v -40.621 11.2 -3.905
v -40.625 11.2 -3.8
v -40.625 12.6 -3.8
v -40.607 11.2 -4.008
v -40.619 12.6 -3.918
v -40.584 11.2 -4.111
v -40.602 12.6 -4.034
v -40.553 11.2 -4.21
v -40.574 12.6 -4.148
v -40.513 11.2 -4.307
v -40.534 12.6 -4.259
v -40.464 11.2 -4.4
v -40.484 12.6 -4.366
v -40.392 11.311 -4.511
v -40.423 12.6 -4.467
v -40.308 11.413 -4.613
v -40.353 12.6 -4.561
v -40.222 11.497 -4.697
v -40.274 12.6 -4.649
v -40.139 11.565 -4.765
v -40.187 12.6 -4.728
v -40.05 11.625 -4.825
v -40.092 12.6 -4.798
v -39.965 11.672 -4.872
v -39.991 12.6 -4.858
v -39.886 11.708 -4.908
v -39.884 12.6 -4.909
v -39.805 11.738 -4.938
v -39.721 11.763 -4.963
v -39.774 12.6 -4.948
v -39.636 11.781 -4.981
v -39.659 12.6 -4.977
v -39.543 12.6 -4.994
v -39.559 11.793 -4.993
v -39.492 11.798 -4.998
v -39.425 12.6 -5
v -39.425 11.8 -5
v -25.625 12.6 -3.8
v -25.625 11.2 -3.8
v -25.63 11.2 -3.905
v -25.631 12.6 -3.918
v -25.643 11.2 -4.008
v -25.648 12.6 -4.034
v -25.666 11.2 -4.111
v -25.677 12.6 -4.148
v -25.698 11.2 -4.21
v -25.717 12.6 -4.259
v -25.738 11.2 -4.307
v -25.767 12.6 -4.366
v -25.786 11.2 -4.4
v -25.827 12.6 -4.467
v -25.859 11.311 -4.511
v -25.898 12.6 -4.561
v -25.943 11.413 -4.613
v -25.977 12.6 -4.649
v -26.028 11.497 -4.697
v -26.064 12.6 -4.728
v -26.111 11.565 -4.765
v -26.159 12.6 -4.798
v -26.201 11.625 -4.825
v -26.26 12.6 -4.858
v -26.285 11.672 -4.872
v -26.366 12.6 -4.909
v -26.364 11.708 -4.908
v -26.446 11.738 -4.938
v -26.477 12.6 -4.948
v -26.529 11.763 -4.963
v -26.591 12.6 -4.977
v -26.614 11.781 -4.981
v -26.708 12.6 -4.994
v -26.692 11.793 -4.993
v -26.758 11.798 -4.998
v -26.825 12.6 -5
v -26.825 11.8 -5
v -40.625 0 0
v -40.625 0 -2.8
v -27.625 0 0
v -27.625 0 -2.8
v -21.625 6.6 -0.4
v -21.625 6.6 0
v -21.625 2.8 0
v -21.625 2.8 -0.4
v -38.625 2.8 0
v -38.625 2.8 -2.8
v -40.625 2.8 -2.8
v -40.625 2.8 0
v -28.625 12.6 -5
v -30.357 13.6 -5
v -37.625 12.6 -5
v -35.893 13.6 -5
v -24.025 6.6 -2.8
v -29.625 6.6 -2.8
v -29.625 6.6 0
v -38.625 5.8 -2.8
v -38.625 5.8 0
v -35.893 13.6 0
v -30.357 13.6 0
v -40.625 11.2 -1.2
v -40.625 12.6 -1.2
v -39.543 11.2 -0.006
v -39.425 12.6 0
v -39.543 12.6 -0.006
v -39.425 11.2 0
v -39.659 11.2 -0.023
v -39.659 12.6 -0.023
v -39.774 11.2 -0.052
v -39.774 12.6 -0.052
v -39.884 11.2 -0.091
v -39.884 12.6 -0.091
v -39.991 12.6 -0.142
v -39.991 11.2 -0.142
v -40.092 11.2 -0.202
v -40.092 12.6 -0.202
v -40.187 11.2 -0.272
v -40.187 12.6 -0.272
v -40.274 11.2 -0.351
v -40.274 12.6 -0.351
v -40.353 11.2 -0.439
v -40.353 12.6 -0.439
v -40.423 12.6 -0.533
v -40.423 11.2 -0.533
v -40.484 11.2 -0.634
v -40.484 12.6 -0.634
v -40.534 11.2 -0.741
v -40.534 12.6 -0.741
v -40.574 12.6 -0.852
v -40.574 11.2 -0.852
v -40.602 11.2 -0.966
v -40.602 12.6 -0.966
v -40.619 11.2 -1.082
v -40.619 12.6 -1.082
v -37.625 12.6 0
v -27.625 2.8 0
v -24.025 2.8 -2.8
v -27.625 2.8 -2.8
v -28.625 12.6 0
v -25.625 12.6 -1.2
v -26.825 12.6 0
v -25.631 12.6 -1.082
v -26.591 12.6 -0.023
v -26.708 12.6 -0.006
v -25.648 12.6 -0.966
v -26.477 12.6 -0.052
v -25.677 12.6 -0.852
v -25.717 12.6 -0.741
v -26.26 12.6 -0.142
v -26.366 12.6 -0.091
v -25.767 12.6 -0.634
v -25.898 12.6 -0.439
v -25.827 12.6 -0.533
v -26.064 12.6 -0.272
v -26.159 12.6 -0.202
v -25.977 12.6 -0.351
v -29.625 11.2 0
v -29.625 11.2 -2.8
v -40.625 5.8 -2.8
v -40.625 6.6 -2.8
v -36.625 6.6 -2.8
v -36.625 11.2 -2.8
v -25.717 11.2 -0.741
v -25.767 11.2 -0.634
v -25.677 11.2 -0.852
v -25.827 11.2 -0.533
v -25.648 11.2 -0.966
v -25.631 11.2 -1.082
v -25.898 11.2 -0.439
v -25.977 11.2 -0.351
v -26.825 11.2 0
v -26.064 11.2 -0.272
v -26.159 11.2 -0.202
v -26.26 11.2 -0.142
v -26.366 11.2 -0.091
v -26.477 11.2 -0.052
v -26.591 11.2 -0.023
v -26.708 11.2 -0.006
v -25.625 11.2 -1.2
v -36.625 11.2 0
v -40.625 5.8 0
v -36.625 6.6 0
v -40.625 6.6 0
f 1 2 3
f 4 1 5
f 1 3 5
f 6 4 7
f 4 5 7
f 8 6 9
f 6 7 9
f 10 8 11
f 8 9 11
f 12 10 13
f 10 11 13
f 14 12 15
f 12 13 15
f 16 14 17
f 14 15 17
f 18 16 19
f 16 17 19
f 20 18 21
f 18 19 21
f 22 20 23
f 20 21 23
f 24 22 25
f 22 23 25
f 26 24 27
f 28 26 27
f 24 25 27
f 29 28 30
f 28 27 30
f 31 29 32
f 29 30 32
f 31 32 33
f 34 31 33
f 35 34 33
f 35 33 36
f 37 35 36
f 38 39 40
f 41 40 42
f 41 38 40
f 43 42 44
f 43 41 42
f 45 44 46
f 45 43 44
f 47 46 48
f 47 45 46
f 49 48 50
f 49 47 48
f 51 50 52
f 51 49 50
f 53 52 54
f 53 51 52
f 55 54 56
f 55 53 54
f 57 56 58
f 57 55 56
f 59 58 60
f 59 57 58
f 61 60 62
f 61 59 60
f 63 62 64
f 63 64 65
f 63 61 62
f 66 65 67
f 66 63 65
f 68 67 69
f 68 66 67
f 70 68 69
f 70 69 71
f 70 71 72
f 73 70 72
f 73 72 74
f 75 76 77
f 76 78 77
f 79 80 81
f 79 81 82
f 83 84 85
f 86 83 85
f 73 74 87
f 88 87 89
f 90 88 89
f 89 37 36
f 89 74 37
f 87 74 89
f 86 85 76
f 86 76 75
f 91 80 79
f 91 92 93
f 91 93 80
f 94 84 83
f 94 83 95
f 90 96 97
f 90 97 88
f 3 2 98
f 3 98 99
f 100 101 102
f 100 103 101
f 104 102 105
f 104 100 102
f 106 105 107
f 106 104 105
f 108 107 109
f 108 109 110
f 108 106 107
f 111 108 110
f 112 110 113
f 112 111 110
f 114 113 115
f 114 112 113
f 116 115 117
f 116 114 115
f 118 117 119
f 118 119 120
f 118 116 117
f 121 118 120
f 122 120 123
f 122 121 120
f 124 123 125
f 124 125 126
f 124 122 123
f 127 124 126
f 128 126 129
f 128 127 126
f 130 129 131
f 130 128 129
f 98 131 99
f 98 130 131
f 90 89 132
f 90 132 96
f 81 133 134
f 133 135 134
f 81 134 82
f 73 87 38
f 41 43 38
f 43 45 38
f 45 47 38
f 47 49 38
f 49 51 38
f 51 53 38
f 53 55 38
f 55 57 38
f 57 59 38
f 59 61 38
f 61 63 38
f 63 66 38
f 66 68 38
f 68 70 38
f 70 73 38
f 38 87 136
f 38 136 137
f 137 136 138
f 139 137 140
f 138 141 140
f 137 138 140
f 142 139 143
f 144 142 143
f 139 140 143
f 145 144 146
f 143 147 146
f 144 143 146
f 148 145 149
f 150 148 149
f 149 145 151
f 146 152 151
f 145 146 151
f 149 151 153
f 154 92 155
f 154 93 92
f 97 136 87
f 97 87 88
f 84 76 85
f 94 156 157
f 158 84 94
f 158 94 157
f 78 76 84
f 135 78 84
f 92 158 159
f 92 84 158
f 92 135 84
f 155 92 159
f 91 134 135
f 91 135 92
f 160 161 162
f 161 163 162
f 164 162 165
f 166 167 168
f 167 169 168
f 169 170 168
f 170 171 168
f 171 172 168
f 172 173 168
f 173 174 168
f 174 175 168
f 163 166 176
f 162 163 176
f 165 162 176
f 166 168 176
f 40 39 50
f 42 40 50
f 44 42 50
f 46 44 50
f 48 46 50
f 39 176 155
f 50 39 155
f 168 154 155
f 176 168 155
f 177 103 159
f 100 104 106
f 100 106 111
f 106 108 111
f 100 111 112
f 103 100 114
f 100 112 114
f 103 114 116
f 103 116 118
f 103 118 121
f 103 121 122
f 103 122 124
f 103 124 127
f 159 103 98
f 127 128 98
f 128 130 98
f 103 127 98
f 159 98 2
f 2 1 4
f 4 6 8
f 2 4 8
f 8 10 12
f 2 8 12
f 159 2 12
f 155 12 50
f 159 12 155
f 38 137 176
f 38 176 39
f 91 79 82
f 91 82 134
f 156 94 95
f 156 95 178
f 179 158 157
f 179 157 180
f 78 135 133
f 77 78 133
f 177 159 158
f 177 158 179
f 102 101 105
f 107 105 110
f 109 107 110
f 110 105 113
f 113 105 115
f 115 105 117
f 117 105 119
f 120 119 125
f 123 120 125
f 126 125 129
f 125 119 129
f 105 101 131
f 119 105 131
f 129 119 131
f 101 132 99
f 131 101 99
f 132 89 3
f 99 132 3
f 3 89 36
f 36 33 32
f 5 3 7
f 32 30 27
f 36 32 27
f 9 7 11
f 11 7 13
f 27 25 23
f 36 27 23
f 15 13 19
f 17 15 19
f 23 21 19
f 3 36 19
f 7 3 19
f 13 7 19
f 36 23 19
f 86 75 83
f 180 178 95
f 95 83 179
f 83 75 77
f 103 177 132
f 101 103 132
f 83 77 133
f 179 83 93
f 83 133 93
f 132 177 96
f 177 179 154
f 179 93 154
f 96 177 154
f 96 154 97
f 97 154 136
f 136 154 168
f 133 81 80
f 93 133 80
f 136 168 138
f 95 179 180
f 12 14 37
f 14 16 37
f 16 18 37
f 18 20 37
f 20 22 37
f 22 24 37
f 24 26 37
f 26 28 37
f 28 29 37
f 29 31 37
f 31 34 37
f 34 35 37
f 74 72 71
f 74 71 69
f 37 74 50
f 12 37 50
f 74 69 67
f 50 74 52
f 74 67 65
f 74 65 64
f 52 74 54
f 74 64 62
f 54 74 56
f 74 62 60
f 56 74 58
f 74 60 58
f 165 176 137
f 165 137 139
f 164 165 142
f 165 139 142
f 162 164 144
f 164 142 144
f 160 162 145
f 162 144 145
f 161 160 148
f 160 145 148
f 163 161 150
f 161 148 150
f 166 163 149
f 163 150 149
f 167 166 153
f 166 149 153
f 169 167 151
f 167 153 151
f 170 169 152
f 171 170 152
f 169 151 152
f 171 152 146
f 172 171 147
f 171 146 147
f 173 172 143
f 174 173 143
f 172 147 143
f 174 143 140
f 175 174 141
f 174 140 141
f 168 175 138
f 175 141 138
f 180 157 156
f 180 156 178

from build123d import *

# Parameters (mm, degrees)
BOSS_EXTRUDE1_DEPTH = 3.8
SKETCH2_W           = 11
SKETCH2_H           = 2.8
BOSS_EXTRUDE2_DEPTH = 7
SKETCH3_W           = 4
SKETCH3_H           = 8.4
CUT_EXTRUDE1_DEPTH  = 43.932622105
SKETCH4_W           = 11
SKETCH4_H           = 2.4
BOSS_EXTRUDE3_DEPTH = 2.2
SKETCH5_W           = 5
SKETCH5_H           = 2.4
BOSS_EXTRUDE4_DEPTH = 4
SKETCH6_W           = 9
SKETCH6_H           = 2.8
BOSS_EXTRUDE5_DEPTH = 2.8
SKETCH7_W           = 2.8
SKETCH7_H           = 6.6
BOSS_EXTRUDE6_DEPTH = 4
SKETCH8_W           = 4.732050808
SKETCH8_H           = 1
CUT_EXTRUDE2_DEPTH  = 44.13200715
SKETCH9_W           = 4.732050807
SKETCH9_H           = 1
CUT_EXTRUDE3_DEPTH  = 44.13200715
SKETCH10_W          = 2
SKETCH10_H          = 3
CUT_EXTRUDE4_DEPTH  = 43.932622105
DRAFT1_ANGLE        = 60
CHAMFER1_SIZE       = 0.6
FILLET1_R           = 1.2


with BuildPart() as part:
    # Sketch1 → Boss-Extrude1 (new body)
    with BuildSketch(Plane(origin=(0, 6.6, 0), x_dir=(1, 0, 0), z_dir=(0, 1, 0))):
        Polygon((-21.625238963, 0.4), (-24.025238963, 2.8), (-40.625238963, 2.8), (-40.625238963, 0), (-21.625238963, 0), align=None)
    extrude(amount=-BOSS_EXTRUDE1_DEPTH)

    # Sketch2 → Boss-Extrude2 (add)
    with BuildSketch(Plane(origin=(0, 6.6, 0), x_dir=(-1, 0, 0), z_dir=(0, 1, 0))):
        with Locations((35.125238963, -1.4)):
            Rectangle(SKETCH2_W, SKETCH2_H)
    extrude(amount=BOSS_EXTRUDE2_DEPTH)

    # Sketch3 → Cut-Extrude1 (cut, through all)
    with BuildSketch(Plane.XY):
        with Locations((-38.625238963, 7)):
            Rectangle(SKETCH3_W, SKETCH3_H)
    extrude(amount=-CUT_EXTRUDE1_DEPTH, mode=Mode.SUBTRACT)

    # Sketch4 → Boss-Extrude3 (add)
    with BuildSketch(Plane(origin=(0, 0, -2.8), x_dir=(-1, 0, 0), z_dir=(0, 0, -1))):
        with Locations((35.125238963, 12.4)):
            Rectangle(SKETCH4_W, SKETCH4_H)
    extrude(amount=BOSS_EXTRUDE3_DEPTH)

    # Sketch5 → Boss-Extrude4 (add)
    with BuildSketch(Plane(origin=(-29.625238963, 0, 0), x_dir=(0, 0, -1), z_dir=(1, 0, 0))):
        with Locations((2.5, 12.4)):
            Rectangle(SKETCH5_W, SKETCH5_H)
    extrude(amount=BOSS_EXTRUDE4_DEPTH)

    # Sketch6 → Boss-Extrude5 (add)
    with BuildSketch(Plane.XZ.offset(-2.8)):
        with Locations((-32.125238963, -1.4)):
            Rectangle(SKETCH6_W, SKETCH6_H)
    extrude(amount=BOSS_EXTRUDE5_DEPTH)

    # Sketch7 → Boss-Extrude6 (add)
    with BuildSketch(Plane.ZY.offset(36.625238963)):
        with Locations((-1.4, 3.3)):
            Rectangle(SKETCH7_W, SKETCH7_H)
    extrude(amount=BOSS_EXTRUDE6_DEPTH)

    # Sketch8 → Cut-Extrude2 (cut, through all)
    with BuildSketch(Plane(origin=(0, 0, -5), x_dir=(-1, 0, 0), z_dir=(0, 0, -1))):
        with Locations((38.259213559, 13.1)):
            Rectangle(SKETCH8_W, SKETCH8_H)
    extrude(amount=-CUT_EXTRUDE2_DEPTH, mode=Mode.SUBTRACT)

    # Sketch9 → Cut-Extrude3 (cut, through all)
    with BuildSketch(Plane.XY):
        with Locations((-27.991264367, 13.1)):
            Rectangle(SKETCH9_W, SKETCH9_H)
    extrude(amount=-CUT_EXTRUDE3_DEPTH, mode=Mode.SUBTRACT)

    # Sketch10 → Cut-Extrude4 (cut, through all)
    with BuildSketch(Plane(origin=(0, 0, -2.8), x_dir=(-1, 0, 0), z_dir=(0, 0, -1))):
        with Locations((39.625238963, 4.3)):
            Rectangle(SKETCH10_W, SKETCH10_H)
    extrude(amount=-CUT_EXTRUDE4_DEPTH, mode=Mode.SUBTRACT)

    # Draft1
    draft1_faces = [part.faces().sort_by_distance(p)[0] for p in [
        (-30.35728977, 13.1, -2.5),
        (-35.893188155, 13.1, -2.5),
    ]]
    draft(draft1_faces, Plane.ZX.offset(13.6), DRAFT1_ANGLE)

    # Chamfer1
    chamfer1_edges = [part.edges().sort_by_distance(p)[0] for p in [
        (-33.125238963, 11.2, -5),
    ]]
    chamfer(chamfer1_edges, length=CHAMFER1_SIZE)

    # Fillet1
    fillet1_edges = [part.edges().sort_by_distance(p)[0] for p in [
        (-25.625238963, 12.2, -5),
        (-25.625238963, 11.9, 0),
        (-40.625238963, 12.2, -5),
        (-40.625238963, 11.9, 0),
    ]]
    fillet(fillet1_edges, radius=FILLET1_R)


solid = part.part
